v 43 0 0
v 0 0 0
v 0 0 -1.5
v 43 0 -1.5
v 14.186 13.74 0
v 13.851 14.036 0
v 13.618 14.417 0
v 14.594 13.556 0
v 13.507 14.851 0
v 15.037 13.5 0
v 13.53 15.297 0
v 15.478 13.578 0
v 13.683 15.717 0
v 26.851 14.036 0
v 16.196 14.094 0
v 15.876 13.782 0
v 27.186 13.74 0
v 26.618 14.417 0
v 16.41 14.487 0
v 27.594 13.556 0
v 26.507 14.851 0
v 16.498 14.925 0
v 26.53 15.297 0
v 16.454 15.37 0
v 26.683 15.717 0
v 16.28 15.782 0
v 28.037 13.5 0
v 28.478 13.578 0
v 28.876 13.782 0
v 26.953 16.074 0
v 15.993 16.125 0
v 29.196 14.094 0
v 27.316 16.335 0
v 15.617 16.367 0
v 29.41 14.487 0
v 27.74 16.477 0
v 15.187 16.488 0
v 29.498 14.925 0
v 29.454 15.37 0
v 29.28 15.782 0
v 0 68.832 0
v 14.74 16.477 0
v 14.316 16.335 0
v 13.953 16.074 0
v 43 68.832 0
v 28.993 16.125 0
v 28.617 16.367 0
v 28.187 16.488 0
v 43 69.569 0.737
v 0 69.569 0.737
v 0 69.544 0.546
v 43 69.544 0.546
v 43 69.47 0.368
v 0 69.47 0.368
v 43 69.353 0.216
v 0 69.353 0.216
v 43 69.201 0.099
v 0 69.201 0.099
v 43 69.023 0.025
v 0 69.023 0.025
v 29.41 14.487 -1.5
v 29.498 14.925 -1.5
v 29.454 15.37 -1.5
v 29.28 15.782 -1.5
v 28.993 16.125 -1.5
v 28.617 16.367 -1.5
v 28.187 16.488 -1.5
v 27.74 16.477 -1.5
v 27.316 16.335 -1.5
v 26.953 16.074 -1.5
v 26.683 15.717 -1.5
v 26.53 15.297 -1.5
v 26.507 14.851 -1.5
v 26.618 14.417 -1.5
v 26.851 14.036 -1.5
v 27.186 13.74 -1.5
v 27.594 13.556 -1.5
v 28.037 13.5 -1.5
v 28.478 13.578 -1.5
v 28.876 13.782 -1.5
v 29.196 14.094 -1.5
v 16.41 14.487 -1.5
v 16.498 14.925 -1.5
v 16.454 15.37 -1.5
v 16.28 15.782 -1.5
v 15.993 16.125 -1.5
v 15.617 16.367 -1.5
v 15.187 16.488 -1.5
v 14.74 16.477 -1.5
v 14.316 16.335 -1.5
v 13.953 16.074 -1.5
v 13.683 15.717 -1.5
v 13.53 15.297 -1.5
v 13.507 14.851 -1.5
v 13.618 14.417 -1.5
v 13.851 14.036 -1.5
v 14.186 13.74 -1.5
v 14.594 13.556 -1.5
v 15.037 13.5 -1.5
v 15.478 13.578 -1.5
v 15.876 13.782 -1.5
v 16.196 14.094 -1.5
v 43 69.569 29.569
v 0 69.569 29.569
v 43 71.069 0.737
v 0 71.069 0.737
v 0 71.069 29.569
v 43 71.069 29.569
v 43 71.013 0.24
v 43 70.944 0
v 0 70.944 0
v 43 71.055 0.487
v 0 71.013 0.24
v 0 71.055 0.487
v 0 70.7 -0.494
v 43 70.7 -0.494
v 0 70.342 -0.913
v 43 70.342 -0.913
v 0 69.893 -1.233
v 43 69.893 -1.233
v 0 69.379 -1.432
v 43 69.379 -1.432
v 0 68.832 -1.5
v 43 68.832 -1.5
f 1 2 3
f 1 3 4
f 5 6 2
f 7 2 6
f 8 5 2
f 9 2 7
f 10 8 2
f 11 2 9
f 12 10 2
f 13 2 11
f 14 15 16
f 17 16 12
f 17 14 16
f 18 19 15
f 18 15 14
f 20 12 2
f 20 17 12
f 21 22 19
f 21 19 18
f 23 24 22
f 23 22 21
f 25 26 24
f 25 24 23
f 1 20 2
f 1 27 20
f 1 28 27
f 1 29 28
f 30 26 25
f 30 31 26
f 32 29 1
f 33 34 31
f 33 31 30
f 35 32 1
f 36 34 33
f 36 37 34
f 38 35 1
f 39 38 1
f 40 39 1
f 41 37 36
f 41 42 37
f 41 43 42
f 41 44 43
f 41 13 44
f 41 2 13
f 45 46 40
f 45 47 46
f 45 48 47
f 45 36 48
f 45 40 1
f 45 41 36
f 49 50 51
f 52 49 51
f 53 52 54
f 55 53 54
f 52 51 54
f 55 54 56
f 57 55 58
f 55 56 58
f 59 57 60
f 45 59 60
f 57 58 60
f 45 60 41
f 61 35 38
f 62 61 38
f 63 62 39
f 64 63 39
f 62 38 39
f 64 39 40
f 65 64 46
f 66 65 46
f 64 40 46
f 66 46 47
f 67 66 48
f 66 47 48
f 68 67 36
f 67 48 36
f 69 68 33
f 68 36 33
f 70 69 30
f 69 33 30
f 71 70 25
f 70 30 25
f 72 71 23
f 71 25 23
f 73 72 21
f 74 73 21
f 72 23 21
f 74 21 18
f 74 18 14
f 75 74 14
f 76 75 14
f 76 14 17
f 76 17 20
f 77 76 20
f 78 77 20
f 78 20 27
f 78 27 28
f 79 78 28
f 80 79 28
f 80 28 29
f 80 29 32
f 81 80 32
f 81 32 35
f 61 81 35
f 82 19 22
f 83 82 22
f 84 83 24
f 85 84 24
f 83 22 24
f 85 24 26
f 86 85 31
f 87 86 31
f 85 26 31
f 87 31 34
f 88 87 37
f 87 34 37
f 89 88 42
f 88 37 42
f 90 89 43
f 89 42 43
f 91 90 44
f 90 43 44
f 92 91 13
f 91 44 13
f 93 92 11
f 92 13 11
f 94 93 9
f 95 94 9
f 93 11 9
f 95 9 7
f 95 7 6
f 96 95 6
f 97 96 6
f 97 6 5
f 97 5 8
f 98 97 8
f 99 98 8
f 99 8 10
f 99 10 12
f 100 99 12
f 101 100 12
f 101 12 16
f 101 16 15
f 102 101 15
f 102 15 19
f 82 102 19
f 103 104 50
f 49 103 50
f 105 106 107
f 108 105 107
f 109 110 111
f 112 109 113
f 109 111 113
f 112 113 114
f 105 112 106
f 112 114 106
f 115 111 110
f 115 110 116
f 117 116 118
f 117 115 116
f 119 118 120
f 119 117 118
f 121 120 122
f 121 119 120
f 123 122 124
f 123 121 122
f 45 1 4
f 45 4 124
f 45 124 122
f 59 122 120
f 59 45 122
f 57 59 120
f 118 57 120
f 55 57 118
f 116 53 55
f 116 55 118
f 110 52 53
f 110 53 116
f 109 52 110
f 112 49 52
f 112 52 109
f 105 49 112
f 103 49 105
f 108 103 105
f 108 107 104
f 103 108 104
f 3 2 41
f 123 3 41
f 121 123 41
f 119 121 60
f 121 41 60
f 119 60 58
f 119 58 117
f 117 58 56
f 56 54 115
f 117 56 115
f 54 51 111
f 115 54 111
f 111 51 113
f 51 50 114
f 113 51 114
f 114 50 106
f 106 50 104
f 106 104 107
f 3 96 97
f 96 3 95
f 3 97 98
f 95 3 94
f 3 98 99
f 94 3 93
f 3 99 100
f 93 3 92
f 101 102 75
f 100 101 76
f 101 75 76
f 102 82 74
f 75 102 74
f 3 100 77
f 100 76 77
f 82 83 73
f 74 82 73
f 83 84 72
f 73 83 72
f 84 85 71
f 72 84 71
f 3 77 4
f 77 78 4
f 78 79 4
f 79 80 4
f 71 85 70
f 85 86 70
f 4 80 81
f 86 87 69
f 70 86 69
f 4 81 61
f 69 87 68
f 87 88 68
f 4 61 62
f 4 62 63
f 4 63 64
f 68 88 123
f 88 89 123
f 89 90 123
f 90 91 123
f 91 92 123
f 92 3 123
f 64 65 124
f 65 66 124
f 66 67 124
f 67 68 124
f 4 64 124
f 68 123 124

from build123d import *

# Parameters (mm, degrees)
SKETCH1_W              = 43
SKETCH1_H              = 100
BASE_FLANGE1_DEPTH     = 1.5
SKETCHED_BEND1_DEPTH   = 43
SKETCHED_BEND1_2_DEPTH = 43
F_3_0MM_DOWEL_HOLE1_D  = 3


# Read off the part's stored shape, not the designer's step: Sketched Bend1
# Sheet-metal steps are written as plain solids
with BuildPart() as part:
    # Sketch1 → Base-Flange1 (new body)
    with BuildSketch(Plane.XY):
        with Locations((21.5, 50)):
            Rectangle(SKETCH1_W, SKETCH1_H)
    extrude(amount=-BASE_FLANGE1_DEPTH)

    # Sketched Bend1 outline → Sketched Bend1 (cut)
    with BuildSketch(Plane.YZ):
        with BuildLine():
            Line((100, 0), (70.944250946, 0))
            ThreePointArc((70.944250946, 0), (70.127591172, -1.086838938), (68.83242709, -1.5))
            Line((68.83242709, -1.5), (100, -1.5))
            Line((100, -1.5), (100, 0))
        make_face()
    extrude(amount=SKETCHED_BEND1_DEPTH, mode=Mode.SUBTRACT)

    # Sketched Bend1 2 outline → Sketched Bend1 2 (add)
    with BuildSketch(Plane.YZ):
        with BuildLine():
            Line((69.56902709, 29.56902709), (69.56902709, 0.7366))
            ThreePointArc((69.56902709, 0.7366), (69.353281945, 0.215745145), (68.83242709, 0))
            Line((68.83242709, 0), (70.944250946, 0))
            ThreePointArc((70.944250946, 0), (71.037612433, 0.363053267), (71.06902709, 0.7366))
            Line((71.06902709, 0.7366), (71.06902709, 29.56902709))
            Line((71.06902709, 29.56902709), (69.56902709, 29.56902709))
        make_face()
    extrude(amount=SKETCHED_BEND1_2_DEPTH)

    # Ø3.0mm Dowel Hole1 (through all)
    with Locations(Plane(origin=(-21.797673733, -43.188016106, -1.5), x_dir=(-0.9396926207859104, 0.34202014332566333, 0), z_dir=(0, 0, -1))):
        with Locations((-26.893032931, 71.71065686), (-14.67702886, 67.264394997)):
            Hole(F_3_0MM_DOWEL_HOLE1_D / 2)


solid = part.part
